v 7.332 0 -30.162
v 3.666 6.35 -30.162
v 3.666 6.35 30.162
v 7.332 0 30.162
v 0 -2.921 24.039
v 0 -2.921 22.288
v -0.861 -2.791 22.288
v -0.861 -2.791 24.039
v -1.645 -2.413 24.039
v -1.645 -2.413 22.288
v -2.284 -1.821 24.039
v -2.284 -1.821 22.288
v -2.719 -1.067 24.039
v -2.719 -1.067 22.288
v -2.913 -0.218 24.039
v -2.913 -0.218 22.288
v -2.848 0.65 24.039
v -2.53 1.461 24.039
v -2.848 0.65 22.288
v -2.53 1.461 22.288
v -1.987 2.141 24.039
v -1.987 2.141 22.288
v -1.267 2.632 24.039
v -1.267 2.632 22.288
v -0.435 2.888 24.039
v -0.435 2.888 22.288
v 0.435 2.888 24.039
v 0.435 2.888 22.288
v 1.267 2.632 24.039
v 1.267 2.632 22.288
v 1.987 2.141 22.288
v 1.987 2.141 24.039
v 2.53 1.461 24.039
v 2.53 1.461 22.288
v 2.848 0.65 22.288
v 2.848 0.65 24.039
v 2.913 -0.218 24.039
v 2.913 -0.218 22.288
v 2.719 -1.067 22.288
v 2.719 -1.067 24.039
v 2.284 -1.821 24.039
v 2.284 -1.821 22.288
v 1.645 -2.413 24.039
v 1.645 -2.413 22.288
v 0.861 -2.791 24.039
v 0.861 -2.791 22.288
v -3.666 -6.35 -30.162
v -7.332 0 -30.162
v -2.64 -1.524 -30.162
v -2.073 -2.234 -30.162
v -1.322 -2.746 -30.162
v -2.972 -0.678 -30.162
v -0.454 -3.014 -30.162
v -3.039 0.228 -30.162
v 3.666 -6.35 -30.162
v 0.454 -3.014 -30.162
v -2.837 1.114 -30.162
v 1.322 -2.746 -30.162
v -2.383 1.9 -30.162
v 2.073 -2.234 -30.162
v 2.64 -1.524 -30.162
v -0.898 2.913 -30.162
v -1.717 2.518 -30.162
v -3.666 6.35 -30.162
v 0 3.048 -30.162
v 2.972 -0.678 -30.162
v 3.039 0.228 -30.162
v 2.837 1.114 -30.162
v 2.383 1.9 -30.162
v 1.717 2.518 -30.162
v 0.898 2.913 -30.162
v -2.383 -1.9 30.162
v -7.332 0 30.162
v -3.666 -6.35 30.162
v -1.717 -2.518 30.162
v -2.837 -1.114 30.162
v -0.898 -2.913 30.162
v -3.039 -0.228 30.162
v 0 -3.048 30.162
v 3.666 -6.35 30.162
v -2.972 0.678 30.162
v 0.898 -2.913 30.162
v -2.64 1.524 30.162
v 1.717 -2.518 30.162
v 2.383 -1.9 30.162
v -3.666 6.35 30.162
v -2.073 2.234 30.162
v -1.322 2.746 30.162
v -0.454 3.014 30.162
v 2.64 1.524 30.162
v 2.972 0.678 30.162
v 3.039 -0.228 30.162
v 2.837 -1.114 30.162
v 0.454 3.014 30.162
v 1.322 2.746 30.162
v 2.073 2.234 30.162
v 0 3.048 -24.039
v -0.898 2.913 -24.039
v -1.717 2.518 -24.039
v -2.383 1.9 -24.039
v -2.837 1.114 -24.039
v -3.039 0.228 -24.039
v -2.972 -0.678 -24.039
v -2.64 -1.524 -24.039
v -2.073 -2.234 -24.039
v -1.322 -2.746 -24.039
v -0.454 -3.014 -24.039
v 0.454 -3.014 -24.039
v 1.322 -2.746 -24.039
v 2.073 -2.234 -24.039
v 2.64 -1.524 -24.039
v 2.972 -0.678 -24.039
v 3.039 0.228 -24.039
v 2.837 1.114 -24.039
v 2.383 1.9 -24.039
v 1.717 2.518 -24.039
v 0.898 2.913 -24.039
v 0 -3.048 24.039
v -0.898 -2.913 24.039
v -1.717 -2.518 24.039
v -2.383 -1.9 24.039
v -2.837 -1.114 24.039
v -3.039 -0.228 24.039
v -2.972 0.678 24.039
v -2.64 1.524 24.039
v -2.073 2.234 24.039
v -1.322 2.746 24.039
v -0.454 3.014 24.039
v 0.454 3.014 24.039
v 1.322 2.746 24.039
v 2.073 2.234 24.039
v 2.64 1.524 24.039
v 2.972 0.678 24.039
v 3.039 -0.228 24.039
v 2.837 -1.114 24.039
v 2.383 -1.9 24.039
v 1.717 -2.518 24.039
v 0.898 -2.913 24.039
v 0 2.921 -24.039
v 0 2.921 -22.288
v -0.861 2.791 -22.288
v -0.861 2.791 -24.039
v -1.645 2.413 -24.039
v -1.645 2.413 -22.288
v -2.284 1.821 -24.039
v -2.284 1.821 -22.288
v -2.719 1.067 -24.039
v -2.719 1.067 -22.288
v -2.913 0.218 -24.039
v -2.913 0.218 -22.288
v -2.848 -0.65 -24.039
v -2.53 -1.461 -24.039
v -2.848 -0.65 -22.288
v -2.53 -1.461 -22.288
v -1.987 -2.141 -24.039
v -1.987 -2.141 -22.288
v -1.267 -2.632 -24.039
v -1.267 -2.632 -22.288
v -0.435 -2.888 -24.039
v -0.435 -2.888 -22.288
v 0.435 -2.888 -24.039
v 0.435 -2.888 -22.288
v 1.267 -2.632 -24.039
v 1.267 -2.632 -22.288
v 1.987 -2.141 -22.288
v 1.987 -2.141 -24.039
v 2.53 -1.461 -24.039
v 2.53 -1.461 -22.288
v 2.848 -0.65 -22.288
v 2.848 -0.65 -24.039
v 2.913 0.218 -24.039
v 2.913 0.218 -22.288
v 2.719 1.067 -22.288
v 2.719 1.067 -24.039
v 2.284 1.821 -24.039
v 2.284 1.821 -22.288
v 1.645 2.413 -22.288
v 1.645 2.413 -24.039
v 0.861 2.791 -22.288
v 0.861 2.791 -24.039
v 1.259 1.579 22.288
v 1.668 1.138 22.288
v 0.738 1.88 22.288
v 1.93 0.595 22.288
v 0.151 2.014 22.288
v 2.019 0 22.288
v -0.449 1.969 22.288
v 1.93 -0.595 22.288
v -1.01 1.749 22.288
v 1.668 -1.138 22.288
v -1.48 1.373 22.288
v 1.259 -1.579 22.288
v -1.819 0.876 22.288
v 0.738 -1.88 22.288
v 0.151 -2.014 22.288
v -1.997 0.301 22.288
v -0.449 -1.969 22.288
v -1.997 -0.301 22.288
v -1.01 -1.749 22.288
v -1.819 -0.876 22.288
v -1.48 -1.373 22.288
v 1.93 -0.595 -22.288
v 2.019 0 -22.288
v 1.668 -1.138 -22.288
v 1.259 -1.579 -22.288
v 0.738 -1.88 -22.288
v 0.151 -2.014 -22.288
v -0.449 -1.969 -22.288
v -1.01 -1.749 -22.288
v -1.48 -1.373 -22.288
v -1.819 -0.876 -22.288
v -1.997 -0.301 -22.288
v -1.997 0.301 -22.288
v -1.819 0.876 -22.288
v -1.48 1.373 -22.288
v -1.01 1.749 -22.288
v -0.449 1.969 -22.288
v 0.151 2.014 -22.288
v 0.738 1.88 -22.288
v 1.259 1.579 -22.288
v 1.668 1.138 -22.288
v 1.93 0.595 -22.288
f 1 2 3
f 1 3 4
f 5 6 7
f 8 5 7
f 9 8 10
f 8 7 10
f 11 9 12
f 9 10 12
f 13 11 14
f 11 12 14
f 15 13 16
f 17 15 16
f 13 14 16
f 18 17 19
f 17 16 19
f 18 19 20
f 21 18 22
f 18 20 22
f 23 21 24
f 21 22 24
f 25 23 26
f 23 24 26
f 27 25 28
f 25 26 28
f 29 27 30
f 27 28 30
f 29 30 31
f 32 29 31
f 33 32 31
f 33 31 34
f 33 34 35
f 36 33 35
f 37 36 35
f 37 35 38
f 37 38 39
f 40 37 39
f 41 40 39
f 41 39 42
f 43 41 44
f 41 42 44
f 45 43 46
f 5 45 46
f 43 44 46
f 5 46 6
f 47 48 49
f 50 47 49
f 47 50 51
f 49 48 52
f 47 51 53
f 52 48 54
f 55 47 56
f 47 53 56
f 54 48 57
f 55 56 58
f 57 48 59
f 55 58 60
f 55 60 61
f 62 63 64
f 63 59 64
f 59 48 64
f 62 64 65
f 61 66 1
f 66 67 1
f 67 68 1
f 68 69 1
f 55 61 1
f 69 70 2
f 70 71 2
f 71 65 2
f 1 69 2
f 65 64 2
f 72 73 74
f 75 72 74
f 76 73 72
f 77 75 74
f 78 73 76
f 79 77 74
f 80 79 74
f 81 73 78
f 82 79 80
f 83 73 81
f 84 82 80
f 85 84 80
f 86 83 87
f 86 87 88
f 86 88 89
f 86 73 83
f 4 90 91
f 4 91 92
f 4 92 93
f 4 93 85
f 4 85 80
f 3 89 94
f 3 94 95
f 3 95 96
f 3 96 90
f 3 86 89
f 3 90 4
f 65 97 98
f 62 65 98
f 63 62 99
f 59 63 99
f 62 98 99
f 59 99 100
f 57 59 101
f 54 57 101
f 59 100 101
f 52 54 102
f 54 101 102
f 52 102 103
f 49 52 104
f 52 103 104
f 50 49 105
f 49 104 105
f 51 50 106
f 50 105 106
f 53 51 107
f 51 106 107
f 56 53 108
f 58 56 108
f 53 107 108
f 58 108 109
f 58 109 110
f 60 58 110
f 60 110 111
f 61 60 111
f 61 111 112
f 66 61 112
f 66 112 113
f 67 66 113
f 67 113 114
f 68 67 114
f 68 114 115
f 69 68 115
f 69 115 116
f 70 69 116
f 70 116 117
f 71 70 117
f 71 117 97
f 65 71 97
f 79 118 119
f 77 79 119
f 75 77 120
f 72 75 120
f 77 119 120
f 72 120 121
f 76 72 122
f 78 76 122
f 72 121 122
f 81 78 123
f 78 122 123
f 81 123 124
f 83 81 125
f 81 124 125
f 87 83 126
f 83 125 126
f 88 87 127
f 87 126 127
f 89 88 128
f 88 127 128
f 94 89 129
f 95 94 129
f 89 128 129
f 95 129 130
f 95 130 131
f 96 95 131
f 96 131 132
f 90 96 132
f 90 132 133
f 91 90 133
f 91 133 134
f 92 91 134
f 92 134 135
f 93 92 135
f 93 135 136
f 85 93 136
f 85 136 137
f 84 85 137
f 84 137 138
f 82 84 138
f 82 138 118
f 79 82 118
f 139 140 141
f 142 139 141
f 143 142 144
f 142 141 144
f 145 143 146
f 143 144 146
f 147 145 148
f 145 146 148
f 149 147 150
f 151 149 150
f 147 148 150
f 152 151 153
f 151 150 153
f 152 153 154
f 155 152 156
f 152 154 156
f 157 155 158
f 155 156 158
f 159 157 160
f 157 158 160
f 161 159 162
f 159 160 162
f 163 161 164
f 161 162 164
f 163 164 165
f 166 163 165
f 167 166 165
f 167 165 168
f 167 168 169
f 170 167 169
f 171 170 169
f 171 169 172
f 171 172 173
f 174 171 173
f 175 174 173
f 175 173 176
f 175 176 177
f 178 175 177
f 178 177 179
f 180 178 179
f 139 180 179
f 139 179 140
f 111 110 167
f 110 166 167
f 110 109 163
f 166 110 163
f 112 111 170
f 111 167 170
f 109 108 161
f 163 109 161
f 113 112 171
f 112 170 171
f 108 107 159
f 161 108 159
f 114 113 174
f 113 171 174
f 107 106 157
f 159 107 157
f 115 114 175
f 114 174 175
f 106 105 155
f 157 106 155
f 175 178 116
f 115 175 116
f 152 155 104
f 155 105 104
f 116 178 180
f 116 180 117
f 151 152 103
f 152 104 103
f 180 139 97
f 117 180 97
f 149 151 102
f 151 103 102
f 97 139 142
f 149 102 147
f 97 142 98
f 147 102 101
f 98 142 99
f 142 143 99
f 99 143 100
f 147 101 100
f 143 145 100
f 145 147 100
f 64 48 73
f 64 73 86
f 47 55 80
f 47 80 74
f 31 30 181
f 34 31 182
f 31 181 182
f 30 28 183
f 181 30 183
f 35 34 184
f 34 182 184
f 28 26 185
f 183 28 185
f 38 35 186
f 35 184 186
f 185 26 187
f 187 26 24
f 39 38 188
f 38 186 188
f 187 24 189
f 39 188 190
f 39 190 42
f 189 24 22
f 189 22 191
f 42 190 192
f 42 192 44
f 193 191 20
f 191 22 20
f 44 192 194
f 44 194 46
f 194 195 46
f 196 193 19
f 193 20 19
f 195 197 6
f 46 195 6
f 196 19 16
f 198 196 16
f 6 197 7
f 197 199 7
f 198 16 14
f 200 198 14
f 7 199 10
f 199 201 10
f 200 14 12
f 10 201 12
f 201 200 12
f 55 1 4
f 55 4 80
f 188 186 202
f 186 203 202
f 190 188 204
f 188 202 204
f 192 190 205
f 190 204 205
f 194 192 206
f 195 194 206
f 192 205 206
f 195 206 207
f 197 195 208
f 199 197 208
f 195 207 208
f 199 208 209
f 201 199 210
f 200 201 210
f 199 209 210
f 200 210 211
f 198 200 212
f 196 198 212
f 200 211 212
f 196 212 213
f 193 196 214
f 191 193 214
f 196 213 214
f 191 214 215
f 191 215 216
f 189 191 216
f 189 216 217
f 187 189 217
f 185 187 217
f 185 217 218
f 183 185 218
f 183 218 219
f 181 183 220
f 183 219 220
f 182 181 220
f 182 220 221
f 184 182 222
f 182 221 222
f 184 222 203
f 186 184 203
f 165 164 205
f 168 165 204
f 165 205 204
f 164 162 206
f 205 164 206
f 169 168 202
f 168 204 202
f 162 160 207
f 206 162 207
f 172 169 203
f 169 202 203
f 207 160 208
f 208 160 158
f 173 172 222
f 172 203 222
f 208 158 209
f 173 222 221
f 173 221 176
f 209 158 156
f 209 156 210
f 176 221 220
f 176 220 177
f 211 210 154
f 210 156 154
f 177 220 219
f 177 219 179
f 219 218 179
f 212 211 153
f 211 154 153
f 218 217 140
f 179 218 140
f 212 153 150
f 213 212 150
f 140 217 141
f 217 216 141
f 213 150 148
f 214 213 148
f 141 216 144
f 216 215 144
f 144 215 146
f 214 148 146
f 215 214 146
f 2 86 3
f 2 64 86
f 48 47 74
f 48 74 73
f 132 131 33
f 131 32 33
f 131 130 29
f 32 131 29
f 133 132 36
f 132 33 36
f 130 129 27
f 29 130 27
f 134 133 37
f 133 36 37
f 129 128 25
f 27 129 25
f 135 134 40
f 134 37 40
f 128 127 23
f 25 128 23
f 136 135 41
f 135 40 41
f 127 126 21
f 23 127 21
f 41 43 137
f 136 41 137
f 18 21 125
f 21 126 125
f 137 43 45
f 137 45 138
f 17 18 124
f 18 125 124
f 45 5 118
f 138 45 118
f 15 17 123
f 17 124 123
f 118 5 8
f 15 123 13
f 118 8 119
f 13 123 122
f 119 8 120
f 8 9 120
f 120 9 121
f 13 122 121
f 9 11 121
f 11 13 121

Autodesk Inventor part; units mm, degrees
ref_plane "YZ Plane" through (0, 0, 0) normal (1, 0, 0) x (0, 1, 0)
ref_plane "XZ Plane" through (0, 0, 0) normal (0, 1, 0) x (-1, 0, 0)
ref_plane "XY Plane" through (0, 0, 0) normal (0, 0, 1) x (1, 0, 0)
sketch "Sketch1" plane through (0, 0, 0) normal (0, 0, 1) x (1, 0, 0)
  line L0 (3.6662, 6.35) -> (7.3323, 0)
  line L1 (7.3323, 0) -> (3.6662, -6.35)
  line L2 (3.6662, -6.35) -> (-3.6662, -6.35)
  line L3 (-3.6662, -6.35) -> (-7.3323, 0)
  line L4 (-7.3323, 0) -> (-3.6662, 6.35)
  line L5 (-3.6662, 6.35) -> (3.6662, 6.35)
  circle A0 centre (0, 0) radius 2.0193
  dimension "d0" = 12.7
  dimension "d3" = 4.0386
extrude "Extrusion2" add sketch "Sketch1" along normal mid plane 60.325
sketch "Sketch2" plane through (0, 0, 30.1625) normal (0, 0, 1) x (1, 0, 0)
  point P0 (0, 0)
  point P1 (0, 0)
hole "Hole1" at (0, 0, 30.1625) direction (0, 0, -1) diameter 5.842 depth 7.874 counterbore diameter 6.096 counterbore depth 6.1239
sketch "Sketch3" plane through (0, 0, -30.1625) normal (0, 0, -1) x (-1, 0, 0)
  circle A0 centre (0, 0) radius 2.0193 projected
hole "Hole2" at (0, 0, -30.1625) direction (0, 0, 1) diameter 5.842 depth 7.874 counterbore diameter 6.096 counterbore depth 6.1239
properties part number "1_2 x 2_375-inchHexShaft"
